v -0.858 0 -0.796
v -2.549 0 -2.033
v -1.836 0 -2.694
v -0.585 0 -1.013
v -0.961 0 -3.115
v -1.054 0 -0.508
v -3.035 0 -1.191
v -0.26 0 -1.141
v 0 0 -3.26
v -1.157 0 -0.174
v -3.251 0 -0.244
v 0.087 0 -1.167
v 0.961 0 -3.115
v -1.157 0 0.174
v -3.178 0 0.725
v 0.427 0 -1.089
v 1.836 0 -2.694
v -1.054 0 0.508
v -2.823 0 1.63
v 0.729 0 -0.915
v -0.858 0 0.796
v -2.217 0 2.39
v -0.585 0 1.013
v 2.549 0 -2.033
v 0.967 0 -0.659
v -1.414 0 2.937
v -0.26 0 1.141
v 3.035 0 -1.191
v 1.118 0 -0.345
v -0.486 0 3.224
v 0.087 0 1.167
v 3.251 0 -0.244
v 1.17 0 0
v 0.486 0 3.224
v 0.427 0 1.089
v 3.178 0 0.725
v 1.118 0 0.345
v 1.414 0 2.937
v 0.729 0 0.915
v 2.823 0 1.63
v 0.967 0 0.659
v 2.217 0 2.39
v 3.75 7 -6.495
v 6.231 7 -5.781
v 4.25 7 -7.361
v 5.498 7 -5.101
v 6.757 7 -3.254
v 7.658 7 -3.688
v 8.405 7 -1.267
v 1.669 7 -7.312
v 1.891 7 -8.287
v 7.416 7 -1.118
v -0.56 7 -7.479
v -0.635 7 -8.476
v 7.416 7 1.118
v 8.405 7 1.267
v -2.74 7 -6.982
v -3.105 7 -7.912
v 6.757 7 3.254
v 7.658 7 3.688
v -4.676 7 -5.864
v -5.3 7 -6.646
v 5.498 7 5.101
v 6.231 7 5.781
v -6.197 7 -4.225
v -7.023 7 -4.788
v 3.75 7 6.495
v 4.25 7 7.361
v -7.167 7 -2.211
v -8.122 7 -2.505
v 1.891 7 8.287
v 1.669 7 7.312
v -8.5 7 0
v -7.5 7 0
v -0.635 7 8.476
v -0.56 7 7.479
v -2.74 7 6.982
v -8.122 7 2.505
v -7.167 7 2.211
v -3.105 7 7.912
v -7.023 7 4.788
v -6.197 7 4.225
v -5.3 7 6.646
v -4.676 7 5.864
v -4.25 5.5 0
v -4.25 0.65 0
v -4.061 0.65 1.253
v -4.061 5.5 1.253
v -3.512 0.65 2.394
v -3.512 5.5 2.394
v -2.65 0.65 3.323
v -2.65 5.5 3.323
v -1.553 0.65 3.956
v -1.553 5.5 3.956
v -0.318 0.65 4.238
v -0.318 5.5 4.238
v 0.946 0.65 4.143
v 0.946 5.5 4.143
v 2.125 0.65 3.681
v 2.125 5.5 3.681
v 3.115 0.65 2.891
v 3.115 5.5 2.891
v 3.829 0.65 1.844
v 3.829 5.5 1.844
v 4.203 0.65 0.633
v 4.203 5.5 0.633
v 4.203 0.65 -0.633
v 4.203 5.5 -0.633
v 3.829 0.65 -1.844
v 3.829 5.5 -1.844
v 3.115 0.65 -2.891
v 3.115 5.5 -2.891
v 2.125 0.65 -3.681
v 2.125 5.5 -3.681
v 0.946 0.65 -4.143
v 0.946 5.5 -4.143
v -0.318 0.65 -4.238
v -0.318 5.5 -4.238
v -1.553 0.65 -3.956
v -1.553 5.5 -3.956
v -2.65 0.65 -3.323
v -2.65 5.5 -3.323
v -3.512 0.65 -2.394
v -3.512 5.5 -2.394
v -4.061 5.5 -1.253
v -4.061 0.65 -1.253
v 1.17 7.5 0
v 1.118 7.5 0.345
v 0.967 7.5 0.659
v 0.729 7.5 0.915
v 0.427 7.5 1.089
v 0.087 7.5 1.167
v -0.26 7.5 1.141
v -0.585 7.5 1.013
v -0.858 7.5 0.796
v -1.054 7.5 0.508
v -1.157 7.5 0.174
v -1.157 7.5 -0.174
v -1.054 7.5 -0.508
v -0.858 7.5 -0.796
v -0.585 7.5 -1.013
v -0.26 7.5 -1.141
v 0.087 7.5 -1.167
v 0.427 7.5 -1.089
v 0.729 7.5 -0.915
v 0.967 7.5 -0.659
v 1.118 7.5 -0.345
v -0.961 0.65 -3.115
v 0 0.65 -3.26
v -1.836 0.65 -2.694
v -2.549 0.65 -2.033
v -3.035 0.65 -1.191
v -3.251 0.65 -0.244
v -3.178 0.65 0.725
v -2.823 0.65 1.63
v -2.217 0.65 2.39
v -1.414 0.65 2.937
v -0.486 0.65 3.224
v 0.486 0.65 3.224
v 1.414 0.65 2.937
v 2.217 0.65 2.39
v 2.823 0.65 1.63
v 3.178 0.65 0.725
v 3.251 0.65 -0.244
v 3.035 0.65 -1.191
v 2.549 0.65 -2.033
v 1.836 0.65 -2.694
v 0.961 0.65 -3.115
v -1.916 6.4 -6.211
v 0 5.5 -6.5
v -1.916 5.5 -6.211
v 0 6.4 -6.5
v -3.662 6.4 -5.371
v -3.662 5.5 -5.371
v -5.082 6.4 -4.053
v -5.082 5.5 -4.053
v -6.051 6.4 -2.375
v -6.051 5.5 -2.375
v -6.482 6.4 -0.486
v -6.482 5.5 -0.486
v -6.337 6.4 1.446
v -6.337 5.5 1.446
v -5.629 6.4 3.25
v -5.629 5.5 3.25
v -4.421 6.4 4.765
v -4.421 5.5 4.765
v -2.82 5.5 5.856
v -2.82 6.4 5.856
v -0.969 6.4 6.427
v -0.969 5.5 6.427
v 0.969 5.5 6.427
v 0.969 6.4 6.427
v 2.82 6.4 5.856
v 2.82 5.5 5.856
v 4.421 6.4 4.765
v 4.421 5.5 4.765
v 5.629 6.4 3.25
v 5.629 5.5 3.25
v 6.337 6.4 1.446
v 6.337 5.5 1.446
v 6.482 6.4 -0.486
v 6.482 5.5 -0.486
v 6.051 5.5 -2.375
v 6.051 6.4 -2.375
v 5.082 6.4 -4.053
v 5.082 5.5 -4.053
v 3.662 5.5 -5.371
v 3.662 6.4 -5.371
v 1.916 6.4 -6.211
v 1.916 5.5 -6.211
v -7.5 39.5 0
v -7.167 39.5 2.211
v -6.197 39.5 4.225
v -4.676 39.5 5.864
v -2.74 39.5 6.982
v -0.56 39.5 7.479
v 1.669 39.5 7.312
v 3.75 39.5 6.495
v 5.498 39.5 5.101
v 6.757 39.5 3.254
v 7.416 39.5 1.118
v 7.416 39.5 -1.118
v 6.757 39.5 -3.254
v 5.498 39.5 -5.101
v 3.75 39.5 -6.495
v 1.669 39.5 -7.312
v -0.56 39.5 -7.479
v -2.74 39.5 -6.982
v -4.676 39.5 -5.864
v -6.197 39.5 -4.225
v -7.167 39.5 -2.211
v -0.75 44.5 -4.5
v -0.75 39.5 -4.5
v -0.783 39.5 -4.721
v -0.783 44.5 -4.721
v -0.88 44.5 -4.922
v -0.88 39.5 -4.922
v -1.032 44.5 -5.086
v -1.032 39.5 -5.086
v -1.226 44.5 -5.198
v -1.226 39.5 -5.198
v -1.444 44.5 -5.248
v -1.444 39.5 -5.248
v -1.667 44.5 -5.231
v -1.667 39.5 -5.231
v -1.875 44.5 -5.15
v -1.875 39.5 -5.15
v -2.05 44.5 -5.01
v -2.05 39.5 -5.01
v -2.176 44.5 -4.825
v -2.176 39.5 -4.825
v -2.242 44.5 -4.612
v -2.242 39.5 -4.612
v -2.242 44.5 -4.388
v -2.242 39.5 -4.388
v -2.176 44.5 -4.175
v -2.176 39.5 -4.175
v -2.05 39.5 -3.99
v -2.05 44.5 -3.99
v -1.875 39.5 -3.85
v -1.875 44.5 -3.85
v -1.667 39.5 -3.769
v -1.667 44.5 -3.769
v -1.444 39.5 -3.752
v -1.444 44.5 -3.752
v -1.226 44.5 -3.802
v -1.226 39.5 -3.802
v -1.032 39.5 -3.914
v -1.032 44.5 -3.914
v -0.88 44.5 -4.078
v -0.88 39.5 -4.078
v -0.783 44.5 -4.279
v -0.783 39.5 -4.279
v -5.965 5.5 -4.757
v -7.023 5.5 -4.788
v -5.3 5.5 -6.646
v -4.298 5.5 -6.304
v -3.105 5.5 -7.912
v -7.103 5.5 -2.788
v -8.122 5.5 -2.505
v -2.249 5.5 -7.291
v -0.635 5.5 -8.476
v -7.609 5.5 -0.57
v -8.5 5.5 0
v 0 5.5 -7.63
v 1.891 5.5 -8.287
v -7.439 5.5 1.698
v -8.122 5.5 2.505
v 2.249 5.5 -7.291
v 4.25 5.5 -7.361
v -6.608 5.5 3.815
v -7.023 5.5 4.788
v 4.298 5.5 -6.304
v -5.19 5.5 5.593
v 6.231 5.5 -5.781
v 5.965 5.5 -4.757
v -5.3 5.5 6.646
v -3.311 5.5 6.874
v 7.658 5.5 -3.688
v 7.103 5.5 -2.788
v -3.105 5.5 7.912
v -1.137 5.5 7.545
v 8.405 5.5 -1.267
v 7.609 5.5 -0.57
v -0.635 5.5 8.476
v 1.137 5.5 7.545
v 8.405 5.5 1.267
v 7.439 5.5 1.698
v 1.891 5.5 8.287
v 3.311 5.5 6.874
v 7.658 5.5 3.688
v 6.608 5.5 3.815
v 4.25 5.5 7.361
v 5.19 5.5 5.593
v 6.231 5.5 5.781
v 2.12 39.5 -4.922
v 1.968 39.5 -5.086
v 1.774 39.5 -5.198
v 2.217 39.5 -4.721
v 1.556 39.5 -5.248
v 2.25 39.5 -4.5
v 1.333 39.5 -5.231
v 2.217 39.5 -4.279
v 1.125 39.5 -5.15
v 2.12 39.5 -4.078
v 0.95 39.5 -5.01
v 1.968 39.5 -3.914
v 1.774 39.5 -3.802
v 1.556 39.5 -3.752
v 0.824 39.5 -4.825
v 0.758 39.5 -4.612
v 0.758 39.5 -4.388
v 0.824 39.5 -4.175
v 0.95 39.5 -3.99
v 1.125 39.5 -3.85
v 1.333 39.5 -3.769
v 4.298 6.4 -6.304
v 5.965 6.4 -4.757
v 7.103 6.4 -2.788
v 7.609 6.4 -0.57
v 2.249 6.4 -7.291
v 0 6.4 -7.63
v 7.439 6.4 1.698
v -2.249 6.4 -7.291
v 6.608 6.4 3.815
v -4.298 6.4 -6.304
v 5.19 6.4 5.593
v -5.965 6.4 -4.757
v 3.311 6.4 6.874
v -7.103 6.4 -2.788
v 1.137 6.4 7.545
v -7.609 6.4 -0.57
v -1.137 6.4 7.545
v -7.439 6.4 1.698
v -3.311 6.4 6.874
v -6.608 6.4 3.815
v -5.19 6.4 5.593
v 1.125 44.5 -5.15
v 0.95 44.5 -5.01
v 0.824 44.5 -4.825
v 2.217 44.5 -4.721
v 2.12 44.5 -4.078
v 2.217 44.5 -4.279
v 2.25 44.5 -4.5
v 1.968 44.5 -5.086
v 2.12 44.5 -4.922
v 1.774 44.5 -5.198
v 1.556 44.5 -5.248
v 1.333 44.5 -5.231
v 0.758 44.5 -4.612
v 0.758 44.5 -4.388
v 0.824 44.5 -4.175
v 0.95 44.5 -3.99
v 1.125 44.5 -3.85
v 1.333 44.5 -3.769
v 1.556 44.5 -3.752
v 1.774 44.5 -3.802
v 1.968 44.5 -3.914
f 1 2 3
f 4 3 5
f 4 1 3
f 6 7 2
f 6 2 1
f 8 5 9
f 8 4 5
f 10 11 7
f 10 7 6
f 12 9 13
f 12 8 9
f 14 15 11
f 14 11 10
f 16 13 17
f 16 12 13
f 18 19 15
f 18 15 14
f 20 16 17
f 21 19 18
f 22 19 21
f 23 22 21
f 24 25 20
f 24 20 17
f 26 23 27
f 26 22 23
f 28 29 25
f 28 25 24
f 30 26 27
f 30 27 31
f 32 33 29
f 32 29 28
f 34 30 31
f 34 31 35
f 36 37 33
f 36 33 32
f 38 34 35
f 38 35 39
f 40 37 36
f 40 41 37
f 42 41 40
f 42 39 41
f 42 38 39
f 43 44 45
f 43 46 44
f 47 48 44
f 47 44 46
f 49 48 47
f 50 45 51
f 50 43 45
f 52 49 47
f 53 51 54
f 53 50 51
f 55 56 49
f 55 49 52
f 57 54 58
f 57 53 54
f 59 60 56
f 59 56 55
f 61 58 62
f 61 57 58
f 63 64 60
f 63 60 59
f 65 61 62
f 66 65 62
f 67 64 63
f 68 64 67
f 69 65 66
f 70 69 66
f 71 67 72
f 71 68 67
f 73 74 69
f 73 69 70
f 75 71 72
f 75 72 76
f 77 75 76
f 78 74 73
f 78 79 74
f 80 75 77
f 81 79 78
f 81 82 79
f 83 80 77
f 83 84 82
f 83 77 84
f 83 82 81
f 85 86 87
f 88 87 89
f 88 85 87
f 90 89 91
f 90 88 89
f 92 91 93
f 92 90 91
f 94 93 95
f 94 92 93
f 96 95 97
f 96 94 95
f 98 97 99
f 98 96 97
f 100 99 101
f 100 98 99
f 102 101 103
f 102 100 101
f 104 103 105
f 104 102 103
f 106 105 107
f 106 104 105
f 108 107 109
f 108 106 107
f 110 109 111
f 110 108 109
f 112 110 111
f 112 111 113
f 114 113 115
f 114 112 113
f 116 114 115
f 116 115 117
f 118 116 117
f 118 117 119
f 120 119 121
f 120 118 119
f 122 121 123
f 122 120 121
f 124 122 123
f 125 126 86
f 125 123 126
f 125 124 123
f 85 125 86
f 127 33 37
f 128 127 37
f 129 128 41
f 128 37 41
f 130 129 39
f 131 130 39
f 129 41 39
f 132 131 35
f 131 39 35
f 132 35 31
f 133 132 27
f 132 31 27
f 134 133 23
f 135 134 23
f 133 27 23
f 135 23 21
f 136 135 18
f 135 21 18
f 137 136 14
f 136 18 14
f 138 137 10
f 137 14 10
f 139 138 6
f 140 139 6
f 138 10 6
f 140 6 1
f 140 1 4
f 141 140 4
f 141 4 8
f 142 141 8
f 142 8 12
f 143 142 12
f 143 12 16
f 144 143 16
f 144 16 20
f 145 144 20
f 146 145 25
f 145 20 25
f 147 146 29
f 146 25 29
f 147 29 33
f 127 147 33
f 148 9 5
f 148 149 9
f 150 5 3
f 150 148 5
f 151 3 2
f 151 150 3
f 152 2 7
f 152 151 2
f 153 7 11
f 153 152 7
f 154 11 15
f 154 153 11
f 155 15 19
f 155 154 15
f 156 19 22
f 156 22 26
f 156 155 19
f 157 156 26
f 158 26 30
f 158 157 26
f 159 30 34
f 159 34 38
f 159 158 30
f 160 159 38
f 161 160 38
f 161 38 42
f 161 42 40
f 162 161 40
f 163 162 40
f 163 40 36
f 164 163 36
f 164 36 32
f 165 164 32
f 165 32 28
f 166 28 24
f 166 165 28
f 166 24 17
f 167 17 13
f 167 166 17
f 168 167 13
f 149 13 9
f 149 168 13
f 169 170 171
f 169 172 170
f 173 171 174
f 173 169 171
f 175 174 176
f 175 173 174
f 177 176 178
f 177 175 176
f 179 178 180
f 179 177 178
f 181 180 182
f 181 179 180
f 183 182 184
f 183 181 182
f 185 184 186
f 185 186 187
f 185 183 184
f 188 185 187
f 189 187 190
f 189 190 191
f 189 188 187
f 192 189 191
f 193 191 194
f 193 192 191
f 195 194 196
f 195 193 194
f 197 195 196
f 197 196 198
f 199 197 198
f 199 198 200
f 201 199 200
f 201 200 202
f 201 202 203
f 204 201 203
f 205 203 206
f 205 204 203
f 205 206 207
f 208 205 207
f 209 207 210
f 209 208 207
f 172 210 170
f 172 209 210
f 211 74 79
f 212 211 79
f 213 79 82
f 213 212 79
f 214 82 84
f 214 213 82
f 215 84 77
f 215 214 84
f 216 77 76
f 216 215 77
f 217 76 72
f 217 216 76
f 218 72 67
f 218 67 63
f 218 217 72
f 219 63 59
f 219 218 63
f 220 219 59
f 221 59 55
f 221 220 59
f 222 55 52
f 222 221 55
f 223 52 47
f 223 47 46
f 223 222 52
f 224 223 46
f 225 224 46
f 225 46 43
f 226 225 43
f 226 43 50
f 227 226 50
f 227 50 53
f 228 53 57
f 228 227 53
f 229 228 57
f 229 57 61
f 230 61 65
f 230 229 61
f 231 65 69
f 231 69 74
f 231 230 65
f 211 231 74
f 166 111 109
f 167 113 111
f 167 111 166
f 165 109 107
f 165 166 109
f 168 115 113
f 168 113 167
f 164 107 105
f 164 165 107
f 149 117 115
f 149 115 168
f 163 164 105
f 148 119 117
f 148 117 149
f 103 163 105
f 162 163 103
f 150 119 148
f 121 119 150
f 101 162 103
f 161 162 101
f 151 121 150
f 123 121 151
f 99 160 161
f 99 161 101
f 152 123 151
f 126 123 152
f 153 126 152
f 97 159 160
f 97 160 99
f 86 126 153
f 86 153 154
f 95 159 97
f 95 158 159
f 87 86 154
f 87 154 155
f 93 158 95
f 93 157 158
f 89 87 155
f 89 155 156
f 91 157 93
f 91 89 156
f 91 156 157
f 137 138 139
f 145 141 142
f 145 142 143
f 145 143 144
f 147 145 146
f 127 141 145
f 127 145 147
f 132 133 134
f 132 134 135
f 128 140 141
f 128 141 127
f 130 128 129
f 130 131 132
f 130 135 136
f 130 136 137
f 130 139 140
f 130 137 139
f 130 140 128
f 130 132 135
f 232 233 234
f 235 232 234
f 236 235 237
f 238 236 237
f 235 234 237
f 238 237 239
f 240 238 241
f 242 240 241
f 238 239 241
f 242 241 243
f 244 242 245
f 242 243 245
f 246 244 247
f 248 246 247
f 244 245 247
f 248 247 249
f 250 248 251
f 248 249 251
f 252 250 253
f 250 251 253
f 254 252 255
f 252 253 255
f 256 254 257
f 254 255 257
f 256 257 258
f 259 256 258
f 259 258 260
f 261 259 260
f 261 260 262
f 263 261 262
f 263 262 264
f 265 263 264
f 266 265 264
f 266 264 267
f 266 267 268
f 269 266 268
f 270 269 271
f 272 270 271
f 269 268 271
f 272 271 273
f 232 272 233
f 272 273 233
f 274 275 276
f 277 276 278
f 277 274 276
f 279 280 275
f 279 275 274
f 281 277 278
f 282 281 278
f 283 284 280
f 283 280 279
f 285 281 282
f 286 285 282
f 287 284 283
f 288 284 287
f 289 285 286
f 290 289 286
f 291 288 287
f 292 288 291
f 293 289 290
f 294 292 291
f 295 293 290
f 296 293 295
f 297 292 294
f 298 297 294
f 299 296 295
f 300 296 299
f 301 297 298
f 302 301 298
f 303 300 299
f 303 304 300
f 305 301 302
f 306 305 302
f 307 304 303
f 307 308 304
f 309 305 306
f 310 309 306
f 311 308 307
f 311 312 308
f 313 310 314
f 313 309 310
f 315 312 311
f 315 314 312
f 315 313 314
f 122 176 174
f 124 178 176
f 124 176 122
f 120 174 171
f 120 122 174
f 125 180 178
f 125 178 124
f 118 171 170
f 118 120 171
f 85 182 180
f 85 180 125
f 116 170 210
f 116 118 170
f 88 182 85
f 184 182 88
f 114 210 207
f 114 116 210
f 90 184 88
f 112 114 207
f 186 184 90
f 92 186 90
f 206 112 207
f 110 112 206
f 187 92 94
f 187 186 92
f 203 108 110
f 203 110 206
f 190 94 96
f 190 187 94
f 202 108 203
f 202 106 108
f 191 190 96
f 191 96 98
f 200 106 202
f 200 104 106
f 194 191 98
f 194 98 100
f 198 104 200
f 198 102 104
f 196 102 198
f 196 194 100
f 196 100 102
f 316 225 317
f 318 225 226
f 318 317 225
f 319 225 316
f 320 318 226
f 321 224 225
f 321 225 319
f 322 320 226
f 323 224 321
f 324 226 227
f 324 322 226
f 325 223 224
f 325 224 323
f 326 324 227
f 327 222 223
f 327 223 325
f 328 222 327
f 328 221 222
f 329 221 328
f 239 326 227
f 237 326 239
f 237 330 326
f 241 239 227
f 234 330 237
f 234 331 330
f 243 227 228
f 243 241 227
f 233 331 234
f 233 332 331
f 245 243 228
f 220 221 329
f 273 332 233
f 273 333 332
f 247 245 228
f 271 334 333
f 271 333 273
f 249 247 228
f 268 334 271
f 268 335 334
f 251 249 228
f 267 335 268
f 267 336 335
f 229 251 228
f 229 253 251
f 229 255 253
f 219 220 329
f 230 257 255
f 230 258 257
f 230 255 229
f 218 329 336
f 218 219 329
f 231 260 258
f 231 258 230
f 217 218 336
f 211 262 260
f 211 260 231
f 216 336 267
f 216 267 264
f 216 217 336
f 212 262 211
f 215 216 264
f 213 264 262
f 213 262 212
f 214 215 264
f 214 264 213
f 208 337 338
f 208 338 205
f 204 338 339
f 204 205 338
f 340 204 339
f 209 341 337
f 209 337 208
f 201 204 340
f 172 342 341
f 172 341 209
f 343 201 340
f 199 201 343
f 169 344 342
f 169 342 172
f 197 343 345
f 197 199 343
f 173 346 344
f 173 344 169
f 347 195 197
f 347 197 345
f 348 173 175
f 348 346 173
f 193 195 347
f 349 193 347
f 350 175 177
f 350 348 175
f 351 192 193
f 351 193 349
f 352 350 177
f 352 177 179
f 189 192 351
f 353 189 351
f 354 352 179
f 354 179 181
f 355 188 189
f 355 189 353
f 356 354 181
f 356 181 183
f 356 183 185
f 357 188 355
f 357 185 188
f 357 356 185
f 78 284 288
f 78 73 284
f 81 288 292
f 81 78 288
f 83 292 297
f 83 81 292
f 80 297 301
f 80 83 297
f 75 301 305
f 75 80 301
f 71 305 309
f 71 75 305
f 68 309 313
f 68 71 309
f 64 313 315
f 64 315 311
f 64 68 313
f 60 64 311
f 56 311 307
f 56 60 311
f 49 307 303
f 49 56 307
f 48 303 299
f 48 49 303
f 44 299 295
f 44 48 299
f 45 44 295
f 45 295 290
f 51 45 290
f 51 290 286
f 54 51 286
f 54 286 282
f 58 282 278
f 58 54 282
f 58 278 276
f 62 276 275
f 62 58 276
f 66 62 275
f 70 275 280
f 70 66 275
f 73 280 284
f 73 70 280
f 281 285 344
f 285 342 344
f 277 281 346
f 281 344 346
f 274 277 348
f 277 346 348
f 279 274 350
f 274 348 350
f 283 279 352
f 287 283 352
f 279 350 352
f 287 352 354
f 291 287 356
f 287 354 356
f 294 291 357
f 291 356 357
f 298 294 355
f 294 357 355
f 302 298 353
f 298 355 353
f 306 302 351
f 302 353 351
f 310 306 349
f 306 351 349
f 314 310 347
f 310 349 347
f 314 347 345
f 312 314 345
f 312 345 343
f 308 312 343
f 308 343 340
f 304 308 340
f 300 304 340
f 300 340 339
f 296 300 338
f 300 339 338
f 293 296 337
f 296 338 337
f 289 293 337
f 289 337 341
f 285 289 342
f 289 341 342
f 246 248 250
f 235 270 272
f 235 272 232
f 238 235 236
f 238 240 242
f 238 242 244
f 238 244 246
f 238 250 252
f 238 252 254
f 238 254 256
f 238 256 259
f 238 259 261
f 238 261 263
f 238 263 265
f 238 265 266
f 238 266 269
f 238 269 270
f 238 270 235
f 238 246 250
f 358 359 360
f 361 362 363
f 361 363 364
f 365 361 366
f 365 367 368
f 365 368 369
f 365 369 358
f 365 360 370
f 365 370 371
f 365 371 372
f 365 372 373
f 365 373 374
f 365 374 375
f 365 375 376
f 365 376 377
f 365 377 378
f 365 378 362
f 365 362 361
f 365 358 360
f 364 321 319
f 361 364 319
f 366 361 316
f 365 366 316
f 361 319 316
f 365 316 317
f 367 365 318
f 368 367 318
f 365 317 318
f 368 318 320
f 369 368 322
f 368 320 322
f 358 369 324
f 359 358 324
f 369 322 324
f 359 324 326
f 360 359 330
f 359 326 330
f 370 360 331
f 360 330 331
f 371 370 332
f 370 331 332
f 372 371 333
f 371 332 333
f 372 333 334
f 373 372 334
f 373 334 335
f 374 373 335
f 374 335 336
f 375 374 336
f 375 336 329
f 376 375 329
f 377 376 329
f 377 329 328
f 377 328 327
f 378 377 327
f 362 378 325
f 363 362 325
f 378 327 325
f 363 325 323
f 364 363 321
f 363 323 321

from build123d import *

# Parameters (mm, degrees)
SKETCH2_R           = 0.75
BOSS_EXTRUDE1_DEPTH = 5
SKETCH3_W           = 0.99
SKETCH3_H           = 0.65
SKETCH4_R           = 1.17
CUT_EXTRUDE1_DEPTH  = 7.5
SKETCH5_W           = 1.13
SKETCH5_H           = 0.9


with BuildPart() as part:
    # Sketch1 → Revolve2 (revolve)
    with BuildSketch(Plane.XY):
        Polygon((0, 0), (-4.25, 0), (-4.25, 5.5), (-8.5, 5.5), (-8.5, 7), (-7.5, 7), (-7.5, 39.5), (0, 39.5), align=None)
    revolve(axis=Axis((0, 0, 0), (0, 1, 0)))

    # Sketch2 → Boss-Extrude1 (add)
    with BuildSketch(Plane(origin=(0, 39.5, 0), x_dir=(1, 0, 0), z_dir=(0, 1, 0))):
        with Locations((1.5, 4.5)):
            Circle(SKETCH2_R)
        with Locations((-1.5, 4.5)):
            Circle(SKETCH2_R)
    extrude(amount=BOSS_EXTRUDE1_DEPTH)

    # Sketch3 → Cut-Revolve1 (revolve, cut)
    with BuildSketch(Plane(origin=(0, 0, 0), x_dir=(0, 0, -1), z_dir=(1, 0, 0))):
        with Locations((3.755, 0.325)):
            Rectangle(SKETCH3_W, SKETCH3_H)
    revolve(axis=Axis((0, 0, 0), (0, 1, 0)), mode=Mode.SUBTRACT)

    # Sketch4 → Cut-Extrude1 (cut)
    with BuildSketch(Plane.XZ):
        Circle(SKETCH4_R)
    extrude(amount=-CUT_EXTRUDE1_DEPTH, mode=Mode.SUBTRACT)

    # Sketch5 → Cut-Revolve2 (revolve, cut)
    with BuildSketch(Plane(origin=(0, 0, 0), x_dir=(0, 0, -1), z_dir=(1, 0, 0))):
        with Locations((7.065, 5.95)):
            Rectangle(SKETCH5_W, SKETCH5_H)
    revolve(axis=Axis((0, 0, 0), (0, 1, 0)), mode=Mode.SUBTRACT)


solid = part.part
